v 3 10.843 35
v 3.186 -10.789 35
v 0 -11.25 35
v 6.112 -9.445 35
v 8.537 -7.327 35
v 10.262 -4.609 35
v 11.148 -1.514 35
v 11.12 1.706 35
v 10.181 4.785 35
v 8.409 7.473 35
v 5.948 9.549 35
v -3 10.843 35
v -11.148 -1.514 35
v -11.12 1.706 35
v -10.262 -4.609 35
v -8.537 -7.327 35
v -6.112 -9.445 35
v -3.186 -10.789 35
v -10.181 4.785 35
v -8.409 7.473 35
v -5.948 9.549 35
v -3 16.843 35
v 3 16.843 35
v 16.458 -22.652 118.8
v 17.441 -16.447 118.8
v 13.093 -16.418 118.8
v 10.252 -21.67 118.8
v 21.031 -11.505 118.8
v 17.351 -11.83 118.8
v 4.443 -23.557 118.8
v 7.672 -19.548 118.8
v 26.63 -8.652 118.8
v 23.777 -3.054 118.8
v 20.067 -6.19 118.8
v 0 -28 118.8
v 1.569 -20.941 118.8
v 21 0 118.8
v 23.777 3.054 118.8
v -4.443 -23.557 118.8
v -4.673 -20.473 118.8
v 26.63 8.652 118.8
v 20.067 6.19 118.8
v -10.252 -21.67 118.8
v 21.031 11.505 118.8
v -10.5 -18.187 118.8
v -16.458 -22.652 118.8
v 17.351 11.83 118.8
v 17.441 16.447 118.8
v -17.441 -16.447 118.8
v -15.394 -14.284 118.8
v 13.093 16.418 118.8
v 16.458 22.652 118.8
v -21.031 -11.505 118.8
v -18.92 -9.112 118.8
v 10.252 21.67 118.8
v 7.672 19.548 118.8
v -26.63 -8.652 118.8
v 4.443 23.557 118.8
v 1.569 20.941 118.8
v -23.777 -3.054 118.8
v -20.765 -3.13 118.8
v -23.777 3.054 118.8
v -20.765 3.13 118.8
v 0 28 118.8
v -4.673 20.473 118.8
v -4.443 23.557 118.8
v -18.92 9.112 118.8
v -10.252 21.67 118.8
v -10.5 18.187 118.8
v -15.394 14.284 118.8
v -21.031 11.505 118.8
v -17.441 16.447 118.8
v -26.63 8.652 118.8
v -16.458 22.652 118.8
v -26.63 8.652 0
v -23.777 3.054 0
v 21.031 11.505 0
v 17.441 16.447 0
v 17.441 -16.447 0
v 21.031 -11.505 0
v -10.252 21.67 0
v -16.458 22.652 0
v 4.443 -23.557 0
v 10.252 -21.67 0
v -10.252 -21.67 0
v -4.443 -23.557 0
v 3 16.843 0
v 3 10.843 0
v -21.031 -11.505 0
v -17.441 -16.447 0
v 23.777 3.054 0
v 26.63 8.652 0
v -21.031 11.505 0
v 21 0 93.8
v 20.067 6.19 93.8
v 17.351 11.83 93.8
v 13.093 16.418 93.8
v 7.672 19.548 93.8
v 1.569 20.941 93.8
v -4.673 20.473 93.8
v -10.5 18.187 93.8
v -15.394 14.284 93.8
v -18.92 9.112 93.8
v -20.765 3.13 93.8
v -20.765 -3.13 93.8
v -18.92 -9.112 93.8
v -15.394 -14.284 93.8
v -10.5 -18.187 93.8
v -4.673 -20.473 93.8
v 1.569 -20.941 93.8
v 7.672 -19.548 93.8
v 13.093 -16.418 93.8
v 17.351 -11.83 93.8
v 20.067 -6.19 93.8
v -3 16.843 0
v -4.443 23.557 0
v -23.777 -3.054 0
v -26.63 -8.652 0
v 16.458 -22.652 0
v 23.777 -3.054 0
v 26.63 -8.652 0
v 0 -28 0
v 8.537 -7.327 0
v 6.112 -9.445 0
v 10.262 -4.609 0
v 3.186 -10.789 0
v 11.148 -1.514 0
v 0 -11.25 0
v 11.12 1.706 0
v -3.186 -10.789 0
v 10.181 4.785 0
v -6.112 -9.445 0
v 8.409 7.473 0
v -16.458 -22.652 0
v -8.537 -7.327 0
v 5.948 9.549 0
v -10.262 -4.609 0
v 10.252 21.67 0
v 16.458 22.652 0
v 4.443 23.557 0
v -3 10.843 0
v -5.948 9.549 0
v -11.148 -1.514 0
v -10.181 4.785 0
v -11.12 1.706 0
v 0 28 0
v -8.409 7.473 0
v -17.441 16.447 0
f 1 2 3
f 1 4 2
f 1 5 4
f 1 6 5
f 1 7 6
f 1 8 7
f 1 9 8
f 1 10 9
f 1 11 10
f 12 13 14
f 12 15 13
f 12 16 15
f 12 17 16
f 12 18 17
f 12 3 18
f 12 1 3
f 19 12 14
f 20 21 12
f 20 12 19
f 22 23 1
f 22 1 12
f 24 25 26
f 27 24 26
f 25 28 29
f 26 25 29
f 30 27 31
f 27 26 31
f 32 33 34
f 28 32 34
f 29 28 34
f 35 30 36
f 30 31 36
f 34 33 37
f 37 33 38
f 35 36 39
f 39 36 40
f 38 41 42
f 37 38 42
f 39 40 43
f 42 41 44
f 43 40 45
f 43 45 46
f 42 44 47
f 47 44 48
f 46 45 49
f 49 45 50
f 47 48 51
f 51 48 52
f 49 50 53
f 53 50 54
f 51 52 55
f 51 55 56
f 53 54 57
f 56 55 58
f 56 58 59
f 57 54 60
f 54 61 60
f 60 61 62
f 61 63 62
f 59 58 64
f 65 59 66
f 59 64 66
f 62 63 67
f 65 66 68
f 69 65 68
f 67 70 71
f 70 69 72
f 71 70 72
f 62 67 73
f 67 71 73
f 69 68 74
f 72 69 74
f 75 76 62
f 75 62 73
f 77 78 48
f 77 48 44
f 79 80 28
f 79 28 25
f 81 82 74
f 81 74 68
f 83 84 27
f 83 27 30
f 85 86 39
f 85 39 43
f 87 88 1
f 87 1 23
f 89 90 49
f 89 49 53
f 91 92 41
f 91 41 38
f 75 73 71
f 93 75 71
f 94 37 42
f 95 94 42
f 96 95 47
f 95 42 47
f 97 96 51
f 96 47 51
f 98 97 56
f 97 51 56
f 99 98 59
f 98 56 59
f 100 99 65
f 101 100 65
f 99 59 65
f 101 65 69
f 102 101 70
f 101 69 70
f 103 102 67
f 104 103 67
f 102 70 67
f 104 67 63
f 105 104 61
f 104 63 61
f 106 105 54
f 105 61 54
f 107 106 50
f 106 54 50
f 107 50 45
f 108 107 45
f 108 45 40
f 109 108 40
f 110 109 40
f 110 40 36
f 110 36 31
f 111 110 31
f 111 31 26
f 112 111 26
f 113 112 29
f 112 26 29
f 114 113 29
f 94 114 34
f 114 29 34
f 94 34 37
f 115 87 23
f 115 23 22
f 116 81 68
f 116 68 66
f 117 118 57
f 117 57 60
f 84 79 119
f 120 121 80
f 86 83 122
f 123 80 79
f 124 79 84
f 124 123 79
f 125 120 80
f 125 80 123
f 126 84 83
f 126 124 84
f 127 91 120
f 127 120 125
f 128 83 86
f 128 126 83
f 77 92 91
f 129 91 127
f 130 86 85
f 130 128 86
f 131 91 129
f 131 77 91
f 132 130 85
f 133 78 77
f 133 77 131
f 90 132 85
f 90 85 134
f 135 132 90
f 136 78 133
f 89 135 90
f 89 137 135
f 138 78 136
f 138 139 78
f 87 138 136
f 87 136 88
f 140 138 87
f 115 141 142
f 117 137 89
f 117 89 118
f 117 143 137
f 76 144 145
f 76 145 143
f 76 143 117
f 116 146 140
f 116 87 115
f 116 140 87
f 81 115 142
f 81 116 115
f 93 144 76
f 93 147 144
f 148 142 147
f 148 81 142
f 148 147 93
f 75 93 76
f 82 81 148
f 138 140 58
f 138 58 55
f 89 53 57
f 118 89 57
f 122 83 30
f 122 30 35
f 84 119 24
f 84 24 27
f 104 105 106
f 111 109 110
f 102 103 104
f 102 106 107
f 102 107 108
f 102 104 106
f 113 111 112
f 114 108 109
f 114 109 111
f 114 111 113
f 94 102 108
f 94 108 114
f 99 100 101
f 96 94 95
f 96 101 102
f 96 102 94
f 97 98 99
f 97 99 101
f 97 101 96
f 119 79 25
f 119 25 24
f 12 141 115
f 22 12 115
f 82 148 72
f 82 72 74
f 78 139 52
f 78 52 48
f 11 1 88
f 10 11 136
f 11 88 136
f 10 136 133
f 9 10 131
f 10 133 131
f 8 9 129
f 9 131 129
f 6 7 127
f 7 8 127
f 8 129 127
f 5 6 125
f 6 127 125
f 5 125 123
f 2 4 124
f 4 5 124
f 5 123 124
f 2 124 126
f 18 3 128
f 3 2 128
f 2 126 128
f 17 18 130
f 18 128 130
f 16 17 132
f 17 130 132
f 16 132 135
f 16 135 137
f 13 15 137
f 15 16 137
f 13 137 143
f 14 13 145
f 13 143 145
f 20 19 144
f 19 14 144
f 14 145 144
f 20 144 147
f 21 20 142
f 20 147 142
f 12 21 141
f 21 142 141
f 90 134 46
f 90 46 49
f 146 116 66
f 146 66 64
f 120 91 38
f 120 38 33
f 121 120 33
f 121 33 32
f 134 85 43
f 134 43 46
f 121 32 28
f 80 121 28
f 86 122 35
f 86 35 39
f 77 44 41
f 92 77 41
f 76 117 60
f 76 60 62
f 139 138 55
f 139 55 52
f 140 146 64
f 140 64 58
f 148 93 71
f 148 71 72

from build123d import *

# Parameters (mm, degrees)
SKETCH2_R           = 22.5
BOSS_EXTRUDE1_DEPTH = 118.8
SKETCH3_R           = 11.25
CUT_EXTRUDE1_DEPTH  = 35
SKETCH4_W           = 6
SKETCH4_H           = 6
CUT_EXTRUDE2_DEPTH  = 35
SKETCH5_R           = 21
CUT_EXTRUDE3_DEPTH  = 25
BOSS_EXTRUDE2_START = -118.8
SKETCH6_R           = 22.5
BOSS_EXTRUDE2_DEPTH = 118.8


with BuildPart() as part:
    # Sketch2 → Boss-Extrude1 (new body)
    with BuildSketch(Plane.XY):
        Circle(SKETCH2_R)
    extrude(amount=BOSS_EXTRUDE1_DEPTH)

    # Sketch3 → Cut-Extrude1 (cut)
    with BuildSketch(Plane(origin=(0, 0, 0), x_dir=(-1, 0, 0), z_dir=(0, 0, -1))):
        Circle(SKETCH3_R)
    extrude(amount=-CUT_EXTRUDE1_DEPTH, mode=Mode.SUBTRACT)

    # Sketch4 → Cut-Extrude2 (cut)
    with BuildSketch(Plane(origin=(0, 0, 0), x_dir=(-1, 0, 0), z_dir=(0, 0, -1))):
        with Locations((0, 13.842624221)):
            Rectangle(SKETCH4_W, SKETCH4_H)
    extrude(amount=-CUT_EXTRUDE2_DEPTH, mode=Mode.SUBTRACT)

    # Sketch5 → Cut-Extrude3 (cut)
    with BuildSketch(Plane.XY.offset(118.8)):
        Circle(SKETCH5_R)
    extrude(amount=-CUT_EXTRUDE3_DEPTH, mode=Mode.SUBTRACT)

    # Sketch6 → Boss-Extrude2 (add)
    with BuildSketch(Plane.XY.offset(118.8).offset(BOSS_EXTRUDE2_START)):
        Polygon((-4.44294699, 23.55705301), (0, 28), (4.44294699, 23.55705301), (10.252068727, 21.66955494), (16.457987064, 22.652475842), (17.440907967, 16.446557506), (21.031142645, 11.505023404), (26.629582456, 8.652475842), (23.777034895, 3.054036032), (23.777034895, -3.054036032), (26.629582456, -8.652475842), (21.031142645, -11.505023404), (17.440907967, -16.446557506), (16.457987064, -22.652475842), (10.252068727, -21.66955494), (4.44294699, -23.55705301), (0, -28), (-4.44294699, -23.55705301), (-10.252068727, -21.66955494), (-16.457987064, -22.652475842), (-17.440907967, -16.446557506), (-21.031142645, -11.505023404), (-26.629582456, -8.652475842), (-23.777034895, -3.054036032), (-23.777034895, 3.054036032), (-26.629582456, 8.652475842), (-21.031142645, 11.505023404), (-17.440907967, 16.446557506), (-16.457987064, 22.652475842), (-10.252068727, 21.66955494), align=None)
        Circle(SKETCH6_R, mode=Mode.SUBTRACT)
    extrude(amount=BOSS_EXTRUDE2_DEPTH)


solid = part.part
